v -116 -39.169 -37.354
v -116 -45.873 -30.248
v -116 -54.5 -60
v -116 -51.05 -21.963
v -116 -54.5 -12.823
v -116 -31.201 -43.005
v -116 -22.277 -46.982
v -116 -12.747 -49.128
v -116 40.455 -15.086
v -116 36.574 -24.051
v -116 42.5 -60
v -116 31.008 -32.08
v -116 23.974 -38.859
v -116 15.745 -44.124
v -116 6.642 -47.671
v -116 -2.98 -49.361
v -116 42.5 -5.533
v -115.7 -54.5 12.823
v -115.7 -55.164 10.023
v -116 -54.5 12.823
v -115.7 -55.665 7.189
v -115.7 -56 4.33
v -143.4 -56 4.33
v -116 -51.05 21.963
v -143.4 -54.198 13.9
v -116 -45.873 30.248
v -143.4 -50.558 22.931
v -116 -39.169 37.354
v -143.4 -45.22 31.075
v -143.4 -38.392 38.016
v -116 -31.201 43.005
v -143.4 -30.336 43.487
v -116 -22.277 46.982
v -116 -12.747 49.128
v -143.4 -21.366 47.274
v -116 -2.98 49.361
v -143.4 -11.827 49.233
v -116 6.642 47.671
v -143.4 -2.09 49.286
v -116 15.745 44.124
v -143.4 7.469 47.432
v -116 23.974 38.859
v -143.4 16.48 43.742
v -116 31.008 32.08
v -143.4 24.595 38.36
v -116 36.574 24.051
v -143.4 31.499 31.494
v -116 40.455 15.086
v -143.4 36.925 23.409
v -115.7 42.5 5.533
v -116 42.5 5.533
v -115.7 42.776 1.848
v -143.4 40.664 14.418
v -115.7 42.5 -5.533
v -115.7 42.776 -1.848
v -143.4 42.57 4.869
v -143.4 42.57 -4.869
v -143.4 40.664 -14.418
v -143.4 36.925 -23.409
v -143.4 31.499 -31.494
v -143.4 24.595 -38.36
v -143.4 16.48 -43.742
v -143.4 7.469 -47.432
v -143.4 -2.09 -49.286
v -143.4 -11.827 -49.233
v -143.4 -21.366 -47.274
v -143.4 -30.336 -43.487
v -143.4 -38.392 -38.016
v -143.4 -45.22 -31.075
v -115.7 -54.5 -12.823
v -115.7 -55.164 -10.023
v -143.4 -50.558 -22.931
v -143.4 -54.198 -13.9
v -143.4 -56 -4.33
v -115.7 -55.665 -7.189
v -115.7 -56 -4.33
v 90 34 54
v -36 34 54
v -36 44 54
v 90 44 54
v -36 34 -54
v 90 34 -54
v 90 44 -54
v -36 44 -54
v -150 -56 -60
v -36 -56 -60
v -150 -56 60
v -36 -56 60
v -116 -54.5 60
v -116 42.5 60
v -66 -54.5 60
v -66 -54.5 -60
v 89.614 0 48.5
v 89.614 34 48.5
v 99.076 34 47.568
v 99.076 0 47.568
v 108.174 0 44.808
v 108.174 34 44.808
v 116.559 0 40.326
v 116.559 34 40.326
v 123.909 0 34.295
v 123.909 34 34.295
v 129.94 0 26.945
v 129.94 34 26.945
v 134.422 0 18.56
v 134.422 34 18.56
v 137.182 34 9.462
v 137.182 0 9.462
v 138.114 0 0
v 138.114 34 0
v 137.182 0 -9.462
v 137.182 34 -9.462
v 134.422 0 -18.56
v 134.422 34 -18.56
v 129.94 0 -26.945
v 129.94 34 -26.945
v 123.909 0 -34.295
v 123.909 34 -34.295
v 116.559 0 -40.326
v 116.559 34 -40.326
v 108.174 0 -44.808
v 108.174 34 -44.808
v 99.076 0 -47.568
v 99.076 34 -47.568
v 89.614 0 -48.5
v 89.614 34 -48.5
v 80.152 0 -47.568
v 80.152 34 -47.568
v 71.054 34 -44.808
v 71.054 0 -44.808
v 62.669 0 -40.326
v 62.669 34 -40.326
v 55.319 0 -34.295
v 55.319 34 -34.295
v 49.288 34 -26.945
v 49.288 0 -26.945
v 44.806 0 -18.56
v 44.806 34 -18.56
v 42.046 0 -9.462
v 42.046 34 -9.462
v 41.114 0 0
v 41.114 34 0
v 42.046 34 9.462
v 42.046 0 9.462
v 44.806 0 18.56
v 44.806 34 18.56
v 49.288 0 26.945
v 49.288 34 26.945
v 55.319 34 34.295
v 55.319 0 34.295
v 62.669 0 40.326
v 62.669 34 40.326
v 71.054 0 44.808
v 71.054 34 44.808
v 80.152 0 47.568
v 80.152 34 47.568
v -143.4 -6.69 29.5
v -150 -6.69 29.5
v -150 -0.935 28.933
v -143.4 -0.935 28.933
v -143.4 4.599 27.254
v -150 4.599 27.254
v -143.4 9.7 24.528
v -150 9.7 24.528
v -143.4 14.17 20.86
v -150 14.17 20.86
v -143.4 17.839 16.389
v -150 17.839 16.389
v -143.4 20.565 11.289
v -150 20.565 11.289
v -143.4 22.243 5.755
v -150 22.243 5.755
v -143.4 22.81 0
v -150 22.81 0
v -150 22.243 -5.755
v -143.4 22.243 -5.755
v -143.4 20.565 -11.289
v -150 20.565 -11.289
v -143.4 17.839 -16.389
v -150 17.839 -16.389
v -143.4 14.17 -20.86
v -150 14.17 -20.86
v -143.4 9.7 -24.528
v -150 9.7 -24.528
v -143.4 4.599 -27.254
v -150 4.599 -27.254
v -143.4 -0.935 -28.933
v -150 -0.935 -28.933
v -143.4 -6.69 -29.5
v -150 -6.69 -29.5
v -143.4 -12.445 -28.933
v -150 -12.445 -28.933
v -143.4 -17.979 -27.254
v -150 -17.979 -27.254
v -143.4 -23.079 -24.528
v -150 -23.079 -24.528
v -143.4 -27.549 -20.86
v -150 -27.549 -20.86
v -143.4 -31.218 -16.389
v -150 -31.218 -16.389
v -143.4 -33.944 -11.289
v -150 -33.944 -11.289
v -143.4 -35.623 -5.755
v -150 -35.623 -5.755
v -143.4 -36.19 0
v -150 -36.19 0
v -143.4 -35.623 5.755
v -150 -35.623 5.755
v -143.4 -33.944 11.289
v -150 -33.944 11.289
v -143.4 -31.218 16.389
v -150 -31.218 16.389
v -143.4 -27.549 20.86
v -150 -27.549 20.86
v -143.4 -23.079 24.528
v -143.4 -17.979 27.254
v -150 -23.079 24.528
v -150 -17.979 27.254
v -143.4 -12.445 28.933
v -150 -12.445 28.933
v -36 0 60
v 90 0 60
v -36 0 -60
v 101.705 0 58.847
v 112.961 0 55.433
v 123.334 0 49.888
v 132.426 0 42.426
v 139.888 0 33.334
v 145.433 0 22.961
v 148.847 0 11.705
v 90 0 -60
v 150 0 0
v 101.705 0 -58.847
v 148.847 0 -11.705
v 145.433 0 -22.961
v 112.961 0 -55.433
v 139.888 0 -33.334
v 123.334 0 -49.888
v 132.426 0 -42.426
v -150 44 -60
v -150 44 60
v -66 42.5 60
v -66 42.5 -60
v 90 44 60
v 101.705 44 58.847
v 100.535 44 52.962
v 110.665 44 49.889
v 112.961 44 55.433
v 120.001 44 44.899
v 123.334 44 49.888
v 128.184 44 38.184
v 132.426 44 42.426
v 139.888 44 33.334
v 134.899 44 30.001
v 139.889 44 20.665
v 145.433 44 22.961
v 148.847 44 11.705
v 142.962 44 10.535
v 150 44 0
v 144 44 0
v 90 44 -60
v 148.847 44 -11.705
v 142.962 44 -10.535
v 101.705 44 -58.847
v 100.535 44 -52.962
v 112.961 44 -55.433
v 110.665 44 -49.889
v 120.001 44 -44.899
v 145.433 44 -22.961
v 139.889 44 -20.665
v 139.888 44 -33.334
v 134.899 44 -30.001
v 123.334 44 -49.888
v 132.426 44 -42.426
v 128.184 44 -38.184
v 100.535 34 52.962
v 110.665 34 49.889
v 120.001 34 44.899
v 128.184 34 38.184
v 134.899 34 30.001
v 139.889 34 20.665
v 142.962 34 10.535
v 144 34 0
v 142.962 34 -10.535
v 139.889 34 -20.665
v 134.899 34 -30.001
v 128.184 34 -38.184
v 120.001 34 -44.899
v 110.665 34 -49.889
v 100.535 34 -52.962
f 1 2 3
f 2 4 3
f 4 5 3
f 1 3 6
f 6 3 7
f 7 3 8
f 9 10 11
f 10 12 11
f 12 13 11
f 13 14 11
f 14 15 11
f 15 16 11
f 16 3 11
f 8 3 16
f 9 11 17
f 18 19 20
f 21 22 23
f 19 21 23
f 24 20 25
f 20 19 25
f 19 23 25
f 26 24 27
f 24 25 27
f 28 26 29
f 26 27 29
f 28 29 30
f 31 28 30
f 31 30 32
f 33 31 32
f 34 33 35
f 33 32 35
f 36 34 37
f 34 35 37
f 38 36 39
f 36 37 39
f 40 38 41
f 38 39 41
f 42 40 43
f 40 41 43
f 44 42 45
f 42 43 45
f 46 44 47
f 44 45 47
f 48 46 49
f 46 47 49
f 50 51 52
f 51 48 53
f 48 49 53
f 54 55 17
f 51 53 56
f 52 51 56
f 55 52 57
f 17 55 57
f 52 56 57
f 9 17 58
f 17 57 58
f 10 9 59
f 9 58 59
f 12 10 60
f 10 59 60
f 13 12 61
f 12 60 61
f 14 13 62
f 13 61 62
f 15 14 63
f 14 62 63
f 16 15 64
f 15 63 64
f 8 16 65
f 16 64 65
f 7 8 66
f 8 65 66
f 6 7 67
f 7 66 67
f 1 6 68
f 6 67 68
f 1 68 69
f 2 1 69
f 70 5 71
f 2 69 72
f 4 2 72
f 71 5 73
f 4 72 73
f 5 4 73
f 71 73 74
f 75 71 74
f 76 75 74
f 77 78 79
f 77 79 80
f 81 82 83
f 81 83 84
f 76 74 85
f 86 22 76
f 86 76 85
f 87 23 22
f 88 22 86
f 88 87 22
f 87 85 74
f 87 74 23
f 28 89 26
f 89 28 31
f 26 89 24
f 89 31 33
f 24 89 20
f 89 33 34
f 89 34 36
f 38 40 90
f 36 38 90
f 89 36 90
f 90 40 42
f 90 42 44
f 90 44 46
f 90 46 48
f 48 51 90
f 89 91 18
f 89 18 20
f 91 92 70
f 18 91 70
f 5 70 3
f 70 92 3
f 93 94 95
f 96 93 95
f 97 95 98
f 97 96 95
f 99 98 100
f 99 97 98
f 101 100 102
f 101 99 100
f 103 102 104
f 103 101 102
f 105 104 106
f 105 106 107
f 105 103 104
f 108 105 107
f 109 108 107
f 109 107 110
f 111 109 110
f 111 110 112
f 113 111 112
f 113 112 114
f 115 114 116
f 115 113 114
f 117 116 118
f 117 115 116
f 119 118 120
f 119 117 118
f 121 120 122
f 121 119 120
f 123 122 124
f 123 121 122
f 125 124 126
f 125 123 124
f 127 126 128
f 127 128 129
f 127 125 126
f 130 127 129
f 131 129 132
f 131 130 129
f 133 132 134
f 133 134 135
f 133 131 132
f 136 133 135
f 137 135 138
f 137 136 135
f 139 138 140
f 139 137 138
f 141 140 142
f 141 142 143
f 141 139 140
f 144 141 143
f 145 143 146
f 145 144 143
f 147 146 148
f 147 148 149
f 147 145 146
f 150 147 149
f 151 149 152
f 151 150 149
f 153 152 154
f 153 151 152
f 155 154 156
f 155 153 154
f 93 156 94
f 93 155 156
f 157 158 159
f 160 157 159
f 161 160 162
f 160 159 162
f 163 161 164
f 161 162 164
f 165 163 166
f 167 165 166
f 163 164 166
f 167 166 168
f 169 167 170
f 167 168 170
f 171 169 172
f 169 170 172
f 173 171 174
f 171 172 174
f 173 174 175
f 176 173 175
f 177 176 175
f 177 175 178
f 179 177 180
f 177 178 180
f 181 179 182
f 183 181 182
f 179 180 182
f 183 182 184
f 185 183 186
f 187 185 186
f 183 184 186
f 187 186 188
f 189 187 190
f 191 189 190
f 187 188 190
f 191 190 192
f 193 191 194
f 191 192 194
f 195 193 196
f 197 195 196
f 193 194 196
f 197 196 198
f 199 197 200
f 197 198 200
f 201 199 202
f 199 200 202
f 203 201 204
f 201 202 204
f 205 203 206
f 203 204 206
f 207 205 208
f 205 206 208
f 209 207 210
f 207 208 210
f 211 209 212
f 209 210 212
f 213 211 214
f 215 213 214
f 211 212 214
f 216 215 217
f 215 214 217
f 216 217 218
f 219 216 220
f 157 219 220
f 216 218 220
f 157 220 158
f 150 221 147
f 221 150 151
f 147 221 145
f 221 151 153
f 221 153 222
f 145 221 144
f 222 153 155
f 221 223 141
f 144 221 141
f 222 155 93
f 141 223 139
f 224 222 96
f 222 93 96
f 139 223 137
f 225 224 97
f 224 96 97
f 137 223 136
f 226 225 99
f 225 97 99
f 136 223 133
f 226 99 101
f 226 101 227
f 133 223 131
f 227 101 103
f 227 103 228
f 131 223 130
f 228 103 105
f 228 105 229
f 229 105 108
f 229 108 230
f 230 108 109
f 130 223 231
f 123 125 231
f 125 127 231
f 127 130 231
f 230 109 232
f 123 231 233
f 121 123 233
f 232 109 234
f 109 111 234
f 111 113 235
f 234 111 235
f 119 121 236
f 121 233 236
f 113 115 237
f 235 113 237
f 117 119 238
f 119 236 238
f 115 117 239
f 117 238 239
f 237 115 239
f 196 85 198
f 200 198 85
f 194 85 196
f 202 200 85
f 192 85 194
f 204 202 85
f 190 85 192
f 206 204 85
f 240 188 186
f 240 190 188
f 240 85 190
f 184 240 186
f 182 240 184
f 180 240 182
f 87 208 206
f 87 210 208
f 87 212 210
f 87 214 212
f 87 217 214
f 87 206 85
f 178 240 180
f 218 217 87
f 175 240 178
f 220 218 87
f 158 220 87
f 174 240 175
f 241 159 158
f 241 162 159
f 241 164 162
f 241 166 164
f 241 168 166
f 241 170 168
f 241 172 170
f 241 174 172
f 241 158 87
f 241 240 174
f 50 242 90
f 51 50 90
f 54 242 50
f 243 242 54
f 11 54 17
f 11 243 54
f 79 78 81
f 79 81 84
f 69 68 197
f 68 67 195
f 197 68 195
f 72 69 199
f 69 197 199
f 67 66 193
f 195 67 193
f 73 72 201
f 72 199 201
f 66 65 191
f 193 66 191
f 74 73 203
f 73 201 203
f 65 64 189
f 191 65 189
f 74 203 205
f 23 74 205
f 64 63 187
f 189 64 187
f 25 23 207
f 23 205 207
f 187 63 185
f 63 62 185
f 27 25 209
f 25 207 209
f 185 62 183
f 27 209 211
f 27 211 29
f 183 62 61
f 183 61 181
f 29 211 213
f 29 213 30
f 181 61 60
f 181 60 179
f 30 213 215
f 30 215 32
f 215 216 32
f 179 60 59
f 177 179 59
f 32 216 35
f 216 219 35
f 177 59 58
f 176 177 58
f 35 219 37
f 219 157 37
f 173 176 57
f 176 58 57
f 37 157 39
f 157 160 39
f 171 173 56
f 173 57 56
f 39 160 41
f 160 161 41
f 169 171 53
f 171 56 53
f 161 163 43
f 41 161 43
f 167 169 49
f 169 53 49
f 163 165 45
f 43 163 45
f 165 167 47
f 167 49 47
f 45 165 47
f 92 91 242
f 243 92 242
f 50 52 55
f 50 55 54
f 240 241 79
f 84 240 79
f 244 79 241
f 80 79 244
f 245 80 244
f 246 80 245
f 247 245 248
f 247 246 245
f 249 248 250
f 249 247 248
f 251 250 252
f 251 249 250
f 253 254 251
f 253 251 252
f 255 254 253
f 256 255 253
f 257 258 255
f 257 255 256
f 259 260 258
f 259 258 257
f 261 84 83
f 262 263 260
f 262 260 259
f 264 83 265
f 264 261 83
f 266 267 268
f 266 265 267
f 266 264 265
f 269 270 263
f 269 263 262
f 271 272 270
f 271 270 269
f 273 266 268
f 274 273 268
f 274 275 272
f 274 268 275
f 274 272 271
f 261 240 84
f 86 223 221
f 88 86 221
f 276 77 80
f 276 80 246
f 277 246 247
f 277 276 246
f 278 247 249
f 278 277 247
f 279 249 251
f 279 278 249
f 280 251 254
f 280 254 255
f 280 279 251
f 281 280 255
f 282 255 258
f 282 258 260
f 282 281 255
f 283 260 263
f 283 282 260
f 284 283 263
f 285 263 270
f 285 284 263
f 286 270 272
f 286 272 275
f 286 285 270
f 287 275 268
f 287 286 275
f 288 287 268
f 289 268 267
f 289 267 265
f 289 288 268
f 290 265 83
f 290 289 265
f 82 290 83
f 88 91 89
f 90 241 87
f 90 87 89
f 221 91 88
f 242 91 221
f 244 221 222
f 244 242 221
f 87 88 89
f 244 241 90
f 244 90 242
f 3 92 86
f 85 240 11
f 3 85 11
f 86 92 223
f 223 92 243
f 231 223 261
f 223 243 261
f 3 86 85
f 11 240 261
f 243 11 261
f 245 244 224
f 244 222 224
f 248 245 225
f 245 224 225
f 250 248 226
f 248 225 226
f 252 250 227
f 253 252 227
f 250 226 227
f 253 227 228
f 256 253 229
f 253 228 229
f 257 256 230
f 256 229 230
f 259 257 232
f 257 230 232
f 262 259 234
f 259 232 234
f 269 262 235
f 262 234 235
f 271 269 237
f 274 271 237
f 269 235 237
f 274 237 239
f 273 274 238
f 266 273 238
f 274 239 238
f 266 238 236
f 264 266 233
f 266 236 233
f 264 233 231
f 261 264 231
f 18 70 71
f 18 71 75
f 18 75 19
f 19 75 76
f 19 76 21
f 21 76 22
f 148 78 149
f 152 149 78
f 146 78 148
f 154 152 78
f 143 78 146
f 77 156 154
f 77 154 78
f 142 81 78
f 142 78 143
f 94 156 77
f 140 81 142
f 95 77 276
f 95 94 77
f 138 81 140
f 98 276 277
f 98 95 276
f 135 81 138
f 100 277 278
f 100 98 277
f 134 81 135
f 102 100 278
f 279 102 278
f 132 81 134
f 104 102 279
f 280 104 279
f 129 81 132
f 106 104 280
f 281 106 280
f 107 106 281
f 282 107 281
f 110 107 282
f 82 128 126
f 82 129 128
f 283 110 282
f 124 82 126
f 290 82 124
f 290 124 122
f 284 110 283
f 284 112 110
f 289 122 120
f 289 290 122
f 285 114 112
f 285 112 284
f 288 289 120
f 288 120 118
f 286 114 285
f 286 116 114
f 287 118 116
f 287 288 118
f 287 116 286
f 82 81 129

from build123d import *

# Parameters (mm, degrees)
SKETCH_1_W          = 300
SKETCH_1_H          = 120
SKETCH_1_R          = 48.5
EXTRUDE_1_DEPTH     = 34
FILLET_2_RADIUS     = 60
FILLET_2_LENGTH     = 34
EXTRUDE_4_DEPTH     = 10
FILLET_3_R          = 54
EXTRUDE_START       = -144
EXTRUDE_5_OUTLINE_W = 10
EXTRUDE_5_OUTLINE_H = 108
EXTRUDE_5_DEPTH     = 108
SKETCH_17_W         = 114
SKETCH_17_H         = 120
EXTRUDE_9_DEPTH     = 56
SKETCH_18_W         = 50
SKETCH_18_H         = 97
CUT_EXTRUDE_1_DEPTH = 201.089979759
SKETCH_20_R         = 29.5
CUT_EXTRUDE_2_DEPTH = 6.6
SKETCH_21_R         = 49.5
CUT_EXTRUDE_3_DEPTH = 27.7


# Read off the part's stored shape, not the designer's step: 凸台-拉伸5
with BuildPart() as part:
    # 草图1 → 凸台-拉伸1 (new body)
    with BuildSketch(Plane(origin=(0, 0, 0), x_dir=(1, 0, 0), z_dir=(0, 1, 0))):
        Rectangle(SKETCH_1_W, SKETCH_1_H)
        with Locations(Location((89.61415623, 0, 0), (0, 0, 270))):
            Circle(SKETCH_1_R, mode=Mode.SUBTRACT)
    extrude(amount=EXTRUDE_1_DEPTH)

    # 圆角2: full round fillet: the end face becomes a half cylinder, R = half its width
    fillet_2_face = Plane((150, 17, 0), x_dir=(0, -1, 0), z_dir=(1, 0, 0))  # on the end face: x along it, z out of the body
    fillet_2_slab = fillet_2_face.offset(-FILLET_2_RADIUS / 2) * Box(FILLET_2_LENGTH, 2 * FILLET_2_RADIUS, FILLET_2_RADIUS, mode=Mode.PRIVATE)  # the body's end, R deep
    fillet_2_round = Plane((90, 17, 0), x_dir=(1, 0, 0), z_dir=(0, -1, 0)) * Cylinder(FILLET_2_RADIUS, FILLET_2_LENGTH, mode=Mode.PRIVATE)  # its axis R under the face
    add(fillet_2_slab - fillet_2_round, mode=Mode.SUBTRACT)

    # 草图3 → 凸台-拉伸4 (add)
    with BuildSketch(Plane(origin=(0, 34, 0), x_dir=(1, 0, 0), z_dir=(0, 1, 0))):
        with BuildLine():
            Line((-150, -60), (90, -60))
            ThreePointArc((90, -60), (150, 0), (90, 60))
            Line((90, 60), (-150, 60))
            Line((-150, 60), (-150, -60))
        make_face()
        with BuildLine():
            Line((-144, -54), (90, -54))
            ThreePointArc((90, -54), (144, 0), (90, 54))
            Line((90, 54), (-144, 54))
            Line((-144, 54), (-144, -54))
        make_face(mode=Mode.SUBTRACT)
    extrude(amount=EXTRUDE_4_DEPTH)

    # 圆角3
    fillet_3_edges = [part.edges().sort_by_distance(p)[0] for p in [
        (-144, 39, 54),
        (-144, 39, -54),
    ]]
    fillet(fillet_3_edges, radius=FILLET_3_R - 0.0001)  # a hair under: the kernel refuses the full size

    # 凸台-拉伸5 outline → 凸台-拉伸5 (add)
    with BuildSketch(Plane.YZ.offset(EXTRUDE_START)):
        with Locations((39, 0)):
            Rectangle(EXTRUDE_5_OUTLINE_W, EXTRUDE_5_OUTLINE_H)
    extrude(amount=EXTRUDE_5_DEPTH)

    # 草图17 → 凸台-拉伸9 (add)
    with BuildSketch(Plane.XZ):
        with Locations((-93, 0)):
            Rectangle(SKETCH_17_W, SKETCH_17_H)
    extrude(amount=EXTRUDE_9_DEPTH)

    # 草图18 → 切除-拉伸1 (cut, through all)
    with BuildSketch(Plane(origin=(0, 0, -60), x_dir=(-1, 0, 0), z_dir=(0, 0, -1))):
        with Locations((91, -6)):
            Rectangle(SKETCH_18_W, SKETCH_18_H)
    extrude(amount=-CUT_EXTRUDE_1_DEPTH, mode=Mode.SUBTRACT)

    # 草图20 → 切除-拉伸2 (cut)
    with BuildSketch(Plane.ZY.offset(150)):
        with Locations((0, -6.689787926)):
            Circle(SKETCH_20_R)
    extrude(amount=-CUT_EXTRUDE_2_DEPTH, mode=Mode.SUBTRACT)

    # 草图21 → 切除-拉伸3 (cut)
    with BuildSketch(Plane.ZY.offset(143.4)):
        with Locations((0, -6.689787926)):
            Circle(SKETCH_21_R)
    extrude(amount=-CUT_EXTRUDE_3_DEPTH, mode=Mode.SUBTRACT)


solid = part.part
